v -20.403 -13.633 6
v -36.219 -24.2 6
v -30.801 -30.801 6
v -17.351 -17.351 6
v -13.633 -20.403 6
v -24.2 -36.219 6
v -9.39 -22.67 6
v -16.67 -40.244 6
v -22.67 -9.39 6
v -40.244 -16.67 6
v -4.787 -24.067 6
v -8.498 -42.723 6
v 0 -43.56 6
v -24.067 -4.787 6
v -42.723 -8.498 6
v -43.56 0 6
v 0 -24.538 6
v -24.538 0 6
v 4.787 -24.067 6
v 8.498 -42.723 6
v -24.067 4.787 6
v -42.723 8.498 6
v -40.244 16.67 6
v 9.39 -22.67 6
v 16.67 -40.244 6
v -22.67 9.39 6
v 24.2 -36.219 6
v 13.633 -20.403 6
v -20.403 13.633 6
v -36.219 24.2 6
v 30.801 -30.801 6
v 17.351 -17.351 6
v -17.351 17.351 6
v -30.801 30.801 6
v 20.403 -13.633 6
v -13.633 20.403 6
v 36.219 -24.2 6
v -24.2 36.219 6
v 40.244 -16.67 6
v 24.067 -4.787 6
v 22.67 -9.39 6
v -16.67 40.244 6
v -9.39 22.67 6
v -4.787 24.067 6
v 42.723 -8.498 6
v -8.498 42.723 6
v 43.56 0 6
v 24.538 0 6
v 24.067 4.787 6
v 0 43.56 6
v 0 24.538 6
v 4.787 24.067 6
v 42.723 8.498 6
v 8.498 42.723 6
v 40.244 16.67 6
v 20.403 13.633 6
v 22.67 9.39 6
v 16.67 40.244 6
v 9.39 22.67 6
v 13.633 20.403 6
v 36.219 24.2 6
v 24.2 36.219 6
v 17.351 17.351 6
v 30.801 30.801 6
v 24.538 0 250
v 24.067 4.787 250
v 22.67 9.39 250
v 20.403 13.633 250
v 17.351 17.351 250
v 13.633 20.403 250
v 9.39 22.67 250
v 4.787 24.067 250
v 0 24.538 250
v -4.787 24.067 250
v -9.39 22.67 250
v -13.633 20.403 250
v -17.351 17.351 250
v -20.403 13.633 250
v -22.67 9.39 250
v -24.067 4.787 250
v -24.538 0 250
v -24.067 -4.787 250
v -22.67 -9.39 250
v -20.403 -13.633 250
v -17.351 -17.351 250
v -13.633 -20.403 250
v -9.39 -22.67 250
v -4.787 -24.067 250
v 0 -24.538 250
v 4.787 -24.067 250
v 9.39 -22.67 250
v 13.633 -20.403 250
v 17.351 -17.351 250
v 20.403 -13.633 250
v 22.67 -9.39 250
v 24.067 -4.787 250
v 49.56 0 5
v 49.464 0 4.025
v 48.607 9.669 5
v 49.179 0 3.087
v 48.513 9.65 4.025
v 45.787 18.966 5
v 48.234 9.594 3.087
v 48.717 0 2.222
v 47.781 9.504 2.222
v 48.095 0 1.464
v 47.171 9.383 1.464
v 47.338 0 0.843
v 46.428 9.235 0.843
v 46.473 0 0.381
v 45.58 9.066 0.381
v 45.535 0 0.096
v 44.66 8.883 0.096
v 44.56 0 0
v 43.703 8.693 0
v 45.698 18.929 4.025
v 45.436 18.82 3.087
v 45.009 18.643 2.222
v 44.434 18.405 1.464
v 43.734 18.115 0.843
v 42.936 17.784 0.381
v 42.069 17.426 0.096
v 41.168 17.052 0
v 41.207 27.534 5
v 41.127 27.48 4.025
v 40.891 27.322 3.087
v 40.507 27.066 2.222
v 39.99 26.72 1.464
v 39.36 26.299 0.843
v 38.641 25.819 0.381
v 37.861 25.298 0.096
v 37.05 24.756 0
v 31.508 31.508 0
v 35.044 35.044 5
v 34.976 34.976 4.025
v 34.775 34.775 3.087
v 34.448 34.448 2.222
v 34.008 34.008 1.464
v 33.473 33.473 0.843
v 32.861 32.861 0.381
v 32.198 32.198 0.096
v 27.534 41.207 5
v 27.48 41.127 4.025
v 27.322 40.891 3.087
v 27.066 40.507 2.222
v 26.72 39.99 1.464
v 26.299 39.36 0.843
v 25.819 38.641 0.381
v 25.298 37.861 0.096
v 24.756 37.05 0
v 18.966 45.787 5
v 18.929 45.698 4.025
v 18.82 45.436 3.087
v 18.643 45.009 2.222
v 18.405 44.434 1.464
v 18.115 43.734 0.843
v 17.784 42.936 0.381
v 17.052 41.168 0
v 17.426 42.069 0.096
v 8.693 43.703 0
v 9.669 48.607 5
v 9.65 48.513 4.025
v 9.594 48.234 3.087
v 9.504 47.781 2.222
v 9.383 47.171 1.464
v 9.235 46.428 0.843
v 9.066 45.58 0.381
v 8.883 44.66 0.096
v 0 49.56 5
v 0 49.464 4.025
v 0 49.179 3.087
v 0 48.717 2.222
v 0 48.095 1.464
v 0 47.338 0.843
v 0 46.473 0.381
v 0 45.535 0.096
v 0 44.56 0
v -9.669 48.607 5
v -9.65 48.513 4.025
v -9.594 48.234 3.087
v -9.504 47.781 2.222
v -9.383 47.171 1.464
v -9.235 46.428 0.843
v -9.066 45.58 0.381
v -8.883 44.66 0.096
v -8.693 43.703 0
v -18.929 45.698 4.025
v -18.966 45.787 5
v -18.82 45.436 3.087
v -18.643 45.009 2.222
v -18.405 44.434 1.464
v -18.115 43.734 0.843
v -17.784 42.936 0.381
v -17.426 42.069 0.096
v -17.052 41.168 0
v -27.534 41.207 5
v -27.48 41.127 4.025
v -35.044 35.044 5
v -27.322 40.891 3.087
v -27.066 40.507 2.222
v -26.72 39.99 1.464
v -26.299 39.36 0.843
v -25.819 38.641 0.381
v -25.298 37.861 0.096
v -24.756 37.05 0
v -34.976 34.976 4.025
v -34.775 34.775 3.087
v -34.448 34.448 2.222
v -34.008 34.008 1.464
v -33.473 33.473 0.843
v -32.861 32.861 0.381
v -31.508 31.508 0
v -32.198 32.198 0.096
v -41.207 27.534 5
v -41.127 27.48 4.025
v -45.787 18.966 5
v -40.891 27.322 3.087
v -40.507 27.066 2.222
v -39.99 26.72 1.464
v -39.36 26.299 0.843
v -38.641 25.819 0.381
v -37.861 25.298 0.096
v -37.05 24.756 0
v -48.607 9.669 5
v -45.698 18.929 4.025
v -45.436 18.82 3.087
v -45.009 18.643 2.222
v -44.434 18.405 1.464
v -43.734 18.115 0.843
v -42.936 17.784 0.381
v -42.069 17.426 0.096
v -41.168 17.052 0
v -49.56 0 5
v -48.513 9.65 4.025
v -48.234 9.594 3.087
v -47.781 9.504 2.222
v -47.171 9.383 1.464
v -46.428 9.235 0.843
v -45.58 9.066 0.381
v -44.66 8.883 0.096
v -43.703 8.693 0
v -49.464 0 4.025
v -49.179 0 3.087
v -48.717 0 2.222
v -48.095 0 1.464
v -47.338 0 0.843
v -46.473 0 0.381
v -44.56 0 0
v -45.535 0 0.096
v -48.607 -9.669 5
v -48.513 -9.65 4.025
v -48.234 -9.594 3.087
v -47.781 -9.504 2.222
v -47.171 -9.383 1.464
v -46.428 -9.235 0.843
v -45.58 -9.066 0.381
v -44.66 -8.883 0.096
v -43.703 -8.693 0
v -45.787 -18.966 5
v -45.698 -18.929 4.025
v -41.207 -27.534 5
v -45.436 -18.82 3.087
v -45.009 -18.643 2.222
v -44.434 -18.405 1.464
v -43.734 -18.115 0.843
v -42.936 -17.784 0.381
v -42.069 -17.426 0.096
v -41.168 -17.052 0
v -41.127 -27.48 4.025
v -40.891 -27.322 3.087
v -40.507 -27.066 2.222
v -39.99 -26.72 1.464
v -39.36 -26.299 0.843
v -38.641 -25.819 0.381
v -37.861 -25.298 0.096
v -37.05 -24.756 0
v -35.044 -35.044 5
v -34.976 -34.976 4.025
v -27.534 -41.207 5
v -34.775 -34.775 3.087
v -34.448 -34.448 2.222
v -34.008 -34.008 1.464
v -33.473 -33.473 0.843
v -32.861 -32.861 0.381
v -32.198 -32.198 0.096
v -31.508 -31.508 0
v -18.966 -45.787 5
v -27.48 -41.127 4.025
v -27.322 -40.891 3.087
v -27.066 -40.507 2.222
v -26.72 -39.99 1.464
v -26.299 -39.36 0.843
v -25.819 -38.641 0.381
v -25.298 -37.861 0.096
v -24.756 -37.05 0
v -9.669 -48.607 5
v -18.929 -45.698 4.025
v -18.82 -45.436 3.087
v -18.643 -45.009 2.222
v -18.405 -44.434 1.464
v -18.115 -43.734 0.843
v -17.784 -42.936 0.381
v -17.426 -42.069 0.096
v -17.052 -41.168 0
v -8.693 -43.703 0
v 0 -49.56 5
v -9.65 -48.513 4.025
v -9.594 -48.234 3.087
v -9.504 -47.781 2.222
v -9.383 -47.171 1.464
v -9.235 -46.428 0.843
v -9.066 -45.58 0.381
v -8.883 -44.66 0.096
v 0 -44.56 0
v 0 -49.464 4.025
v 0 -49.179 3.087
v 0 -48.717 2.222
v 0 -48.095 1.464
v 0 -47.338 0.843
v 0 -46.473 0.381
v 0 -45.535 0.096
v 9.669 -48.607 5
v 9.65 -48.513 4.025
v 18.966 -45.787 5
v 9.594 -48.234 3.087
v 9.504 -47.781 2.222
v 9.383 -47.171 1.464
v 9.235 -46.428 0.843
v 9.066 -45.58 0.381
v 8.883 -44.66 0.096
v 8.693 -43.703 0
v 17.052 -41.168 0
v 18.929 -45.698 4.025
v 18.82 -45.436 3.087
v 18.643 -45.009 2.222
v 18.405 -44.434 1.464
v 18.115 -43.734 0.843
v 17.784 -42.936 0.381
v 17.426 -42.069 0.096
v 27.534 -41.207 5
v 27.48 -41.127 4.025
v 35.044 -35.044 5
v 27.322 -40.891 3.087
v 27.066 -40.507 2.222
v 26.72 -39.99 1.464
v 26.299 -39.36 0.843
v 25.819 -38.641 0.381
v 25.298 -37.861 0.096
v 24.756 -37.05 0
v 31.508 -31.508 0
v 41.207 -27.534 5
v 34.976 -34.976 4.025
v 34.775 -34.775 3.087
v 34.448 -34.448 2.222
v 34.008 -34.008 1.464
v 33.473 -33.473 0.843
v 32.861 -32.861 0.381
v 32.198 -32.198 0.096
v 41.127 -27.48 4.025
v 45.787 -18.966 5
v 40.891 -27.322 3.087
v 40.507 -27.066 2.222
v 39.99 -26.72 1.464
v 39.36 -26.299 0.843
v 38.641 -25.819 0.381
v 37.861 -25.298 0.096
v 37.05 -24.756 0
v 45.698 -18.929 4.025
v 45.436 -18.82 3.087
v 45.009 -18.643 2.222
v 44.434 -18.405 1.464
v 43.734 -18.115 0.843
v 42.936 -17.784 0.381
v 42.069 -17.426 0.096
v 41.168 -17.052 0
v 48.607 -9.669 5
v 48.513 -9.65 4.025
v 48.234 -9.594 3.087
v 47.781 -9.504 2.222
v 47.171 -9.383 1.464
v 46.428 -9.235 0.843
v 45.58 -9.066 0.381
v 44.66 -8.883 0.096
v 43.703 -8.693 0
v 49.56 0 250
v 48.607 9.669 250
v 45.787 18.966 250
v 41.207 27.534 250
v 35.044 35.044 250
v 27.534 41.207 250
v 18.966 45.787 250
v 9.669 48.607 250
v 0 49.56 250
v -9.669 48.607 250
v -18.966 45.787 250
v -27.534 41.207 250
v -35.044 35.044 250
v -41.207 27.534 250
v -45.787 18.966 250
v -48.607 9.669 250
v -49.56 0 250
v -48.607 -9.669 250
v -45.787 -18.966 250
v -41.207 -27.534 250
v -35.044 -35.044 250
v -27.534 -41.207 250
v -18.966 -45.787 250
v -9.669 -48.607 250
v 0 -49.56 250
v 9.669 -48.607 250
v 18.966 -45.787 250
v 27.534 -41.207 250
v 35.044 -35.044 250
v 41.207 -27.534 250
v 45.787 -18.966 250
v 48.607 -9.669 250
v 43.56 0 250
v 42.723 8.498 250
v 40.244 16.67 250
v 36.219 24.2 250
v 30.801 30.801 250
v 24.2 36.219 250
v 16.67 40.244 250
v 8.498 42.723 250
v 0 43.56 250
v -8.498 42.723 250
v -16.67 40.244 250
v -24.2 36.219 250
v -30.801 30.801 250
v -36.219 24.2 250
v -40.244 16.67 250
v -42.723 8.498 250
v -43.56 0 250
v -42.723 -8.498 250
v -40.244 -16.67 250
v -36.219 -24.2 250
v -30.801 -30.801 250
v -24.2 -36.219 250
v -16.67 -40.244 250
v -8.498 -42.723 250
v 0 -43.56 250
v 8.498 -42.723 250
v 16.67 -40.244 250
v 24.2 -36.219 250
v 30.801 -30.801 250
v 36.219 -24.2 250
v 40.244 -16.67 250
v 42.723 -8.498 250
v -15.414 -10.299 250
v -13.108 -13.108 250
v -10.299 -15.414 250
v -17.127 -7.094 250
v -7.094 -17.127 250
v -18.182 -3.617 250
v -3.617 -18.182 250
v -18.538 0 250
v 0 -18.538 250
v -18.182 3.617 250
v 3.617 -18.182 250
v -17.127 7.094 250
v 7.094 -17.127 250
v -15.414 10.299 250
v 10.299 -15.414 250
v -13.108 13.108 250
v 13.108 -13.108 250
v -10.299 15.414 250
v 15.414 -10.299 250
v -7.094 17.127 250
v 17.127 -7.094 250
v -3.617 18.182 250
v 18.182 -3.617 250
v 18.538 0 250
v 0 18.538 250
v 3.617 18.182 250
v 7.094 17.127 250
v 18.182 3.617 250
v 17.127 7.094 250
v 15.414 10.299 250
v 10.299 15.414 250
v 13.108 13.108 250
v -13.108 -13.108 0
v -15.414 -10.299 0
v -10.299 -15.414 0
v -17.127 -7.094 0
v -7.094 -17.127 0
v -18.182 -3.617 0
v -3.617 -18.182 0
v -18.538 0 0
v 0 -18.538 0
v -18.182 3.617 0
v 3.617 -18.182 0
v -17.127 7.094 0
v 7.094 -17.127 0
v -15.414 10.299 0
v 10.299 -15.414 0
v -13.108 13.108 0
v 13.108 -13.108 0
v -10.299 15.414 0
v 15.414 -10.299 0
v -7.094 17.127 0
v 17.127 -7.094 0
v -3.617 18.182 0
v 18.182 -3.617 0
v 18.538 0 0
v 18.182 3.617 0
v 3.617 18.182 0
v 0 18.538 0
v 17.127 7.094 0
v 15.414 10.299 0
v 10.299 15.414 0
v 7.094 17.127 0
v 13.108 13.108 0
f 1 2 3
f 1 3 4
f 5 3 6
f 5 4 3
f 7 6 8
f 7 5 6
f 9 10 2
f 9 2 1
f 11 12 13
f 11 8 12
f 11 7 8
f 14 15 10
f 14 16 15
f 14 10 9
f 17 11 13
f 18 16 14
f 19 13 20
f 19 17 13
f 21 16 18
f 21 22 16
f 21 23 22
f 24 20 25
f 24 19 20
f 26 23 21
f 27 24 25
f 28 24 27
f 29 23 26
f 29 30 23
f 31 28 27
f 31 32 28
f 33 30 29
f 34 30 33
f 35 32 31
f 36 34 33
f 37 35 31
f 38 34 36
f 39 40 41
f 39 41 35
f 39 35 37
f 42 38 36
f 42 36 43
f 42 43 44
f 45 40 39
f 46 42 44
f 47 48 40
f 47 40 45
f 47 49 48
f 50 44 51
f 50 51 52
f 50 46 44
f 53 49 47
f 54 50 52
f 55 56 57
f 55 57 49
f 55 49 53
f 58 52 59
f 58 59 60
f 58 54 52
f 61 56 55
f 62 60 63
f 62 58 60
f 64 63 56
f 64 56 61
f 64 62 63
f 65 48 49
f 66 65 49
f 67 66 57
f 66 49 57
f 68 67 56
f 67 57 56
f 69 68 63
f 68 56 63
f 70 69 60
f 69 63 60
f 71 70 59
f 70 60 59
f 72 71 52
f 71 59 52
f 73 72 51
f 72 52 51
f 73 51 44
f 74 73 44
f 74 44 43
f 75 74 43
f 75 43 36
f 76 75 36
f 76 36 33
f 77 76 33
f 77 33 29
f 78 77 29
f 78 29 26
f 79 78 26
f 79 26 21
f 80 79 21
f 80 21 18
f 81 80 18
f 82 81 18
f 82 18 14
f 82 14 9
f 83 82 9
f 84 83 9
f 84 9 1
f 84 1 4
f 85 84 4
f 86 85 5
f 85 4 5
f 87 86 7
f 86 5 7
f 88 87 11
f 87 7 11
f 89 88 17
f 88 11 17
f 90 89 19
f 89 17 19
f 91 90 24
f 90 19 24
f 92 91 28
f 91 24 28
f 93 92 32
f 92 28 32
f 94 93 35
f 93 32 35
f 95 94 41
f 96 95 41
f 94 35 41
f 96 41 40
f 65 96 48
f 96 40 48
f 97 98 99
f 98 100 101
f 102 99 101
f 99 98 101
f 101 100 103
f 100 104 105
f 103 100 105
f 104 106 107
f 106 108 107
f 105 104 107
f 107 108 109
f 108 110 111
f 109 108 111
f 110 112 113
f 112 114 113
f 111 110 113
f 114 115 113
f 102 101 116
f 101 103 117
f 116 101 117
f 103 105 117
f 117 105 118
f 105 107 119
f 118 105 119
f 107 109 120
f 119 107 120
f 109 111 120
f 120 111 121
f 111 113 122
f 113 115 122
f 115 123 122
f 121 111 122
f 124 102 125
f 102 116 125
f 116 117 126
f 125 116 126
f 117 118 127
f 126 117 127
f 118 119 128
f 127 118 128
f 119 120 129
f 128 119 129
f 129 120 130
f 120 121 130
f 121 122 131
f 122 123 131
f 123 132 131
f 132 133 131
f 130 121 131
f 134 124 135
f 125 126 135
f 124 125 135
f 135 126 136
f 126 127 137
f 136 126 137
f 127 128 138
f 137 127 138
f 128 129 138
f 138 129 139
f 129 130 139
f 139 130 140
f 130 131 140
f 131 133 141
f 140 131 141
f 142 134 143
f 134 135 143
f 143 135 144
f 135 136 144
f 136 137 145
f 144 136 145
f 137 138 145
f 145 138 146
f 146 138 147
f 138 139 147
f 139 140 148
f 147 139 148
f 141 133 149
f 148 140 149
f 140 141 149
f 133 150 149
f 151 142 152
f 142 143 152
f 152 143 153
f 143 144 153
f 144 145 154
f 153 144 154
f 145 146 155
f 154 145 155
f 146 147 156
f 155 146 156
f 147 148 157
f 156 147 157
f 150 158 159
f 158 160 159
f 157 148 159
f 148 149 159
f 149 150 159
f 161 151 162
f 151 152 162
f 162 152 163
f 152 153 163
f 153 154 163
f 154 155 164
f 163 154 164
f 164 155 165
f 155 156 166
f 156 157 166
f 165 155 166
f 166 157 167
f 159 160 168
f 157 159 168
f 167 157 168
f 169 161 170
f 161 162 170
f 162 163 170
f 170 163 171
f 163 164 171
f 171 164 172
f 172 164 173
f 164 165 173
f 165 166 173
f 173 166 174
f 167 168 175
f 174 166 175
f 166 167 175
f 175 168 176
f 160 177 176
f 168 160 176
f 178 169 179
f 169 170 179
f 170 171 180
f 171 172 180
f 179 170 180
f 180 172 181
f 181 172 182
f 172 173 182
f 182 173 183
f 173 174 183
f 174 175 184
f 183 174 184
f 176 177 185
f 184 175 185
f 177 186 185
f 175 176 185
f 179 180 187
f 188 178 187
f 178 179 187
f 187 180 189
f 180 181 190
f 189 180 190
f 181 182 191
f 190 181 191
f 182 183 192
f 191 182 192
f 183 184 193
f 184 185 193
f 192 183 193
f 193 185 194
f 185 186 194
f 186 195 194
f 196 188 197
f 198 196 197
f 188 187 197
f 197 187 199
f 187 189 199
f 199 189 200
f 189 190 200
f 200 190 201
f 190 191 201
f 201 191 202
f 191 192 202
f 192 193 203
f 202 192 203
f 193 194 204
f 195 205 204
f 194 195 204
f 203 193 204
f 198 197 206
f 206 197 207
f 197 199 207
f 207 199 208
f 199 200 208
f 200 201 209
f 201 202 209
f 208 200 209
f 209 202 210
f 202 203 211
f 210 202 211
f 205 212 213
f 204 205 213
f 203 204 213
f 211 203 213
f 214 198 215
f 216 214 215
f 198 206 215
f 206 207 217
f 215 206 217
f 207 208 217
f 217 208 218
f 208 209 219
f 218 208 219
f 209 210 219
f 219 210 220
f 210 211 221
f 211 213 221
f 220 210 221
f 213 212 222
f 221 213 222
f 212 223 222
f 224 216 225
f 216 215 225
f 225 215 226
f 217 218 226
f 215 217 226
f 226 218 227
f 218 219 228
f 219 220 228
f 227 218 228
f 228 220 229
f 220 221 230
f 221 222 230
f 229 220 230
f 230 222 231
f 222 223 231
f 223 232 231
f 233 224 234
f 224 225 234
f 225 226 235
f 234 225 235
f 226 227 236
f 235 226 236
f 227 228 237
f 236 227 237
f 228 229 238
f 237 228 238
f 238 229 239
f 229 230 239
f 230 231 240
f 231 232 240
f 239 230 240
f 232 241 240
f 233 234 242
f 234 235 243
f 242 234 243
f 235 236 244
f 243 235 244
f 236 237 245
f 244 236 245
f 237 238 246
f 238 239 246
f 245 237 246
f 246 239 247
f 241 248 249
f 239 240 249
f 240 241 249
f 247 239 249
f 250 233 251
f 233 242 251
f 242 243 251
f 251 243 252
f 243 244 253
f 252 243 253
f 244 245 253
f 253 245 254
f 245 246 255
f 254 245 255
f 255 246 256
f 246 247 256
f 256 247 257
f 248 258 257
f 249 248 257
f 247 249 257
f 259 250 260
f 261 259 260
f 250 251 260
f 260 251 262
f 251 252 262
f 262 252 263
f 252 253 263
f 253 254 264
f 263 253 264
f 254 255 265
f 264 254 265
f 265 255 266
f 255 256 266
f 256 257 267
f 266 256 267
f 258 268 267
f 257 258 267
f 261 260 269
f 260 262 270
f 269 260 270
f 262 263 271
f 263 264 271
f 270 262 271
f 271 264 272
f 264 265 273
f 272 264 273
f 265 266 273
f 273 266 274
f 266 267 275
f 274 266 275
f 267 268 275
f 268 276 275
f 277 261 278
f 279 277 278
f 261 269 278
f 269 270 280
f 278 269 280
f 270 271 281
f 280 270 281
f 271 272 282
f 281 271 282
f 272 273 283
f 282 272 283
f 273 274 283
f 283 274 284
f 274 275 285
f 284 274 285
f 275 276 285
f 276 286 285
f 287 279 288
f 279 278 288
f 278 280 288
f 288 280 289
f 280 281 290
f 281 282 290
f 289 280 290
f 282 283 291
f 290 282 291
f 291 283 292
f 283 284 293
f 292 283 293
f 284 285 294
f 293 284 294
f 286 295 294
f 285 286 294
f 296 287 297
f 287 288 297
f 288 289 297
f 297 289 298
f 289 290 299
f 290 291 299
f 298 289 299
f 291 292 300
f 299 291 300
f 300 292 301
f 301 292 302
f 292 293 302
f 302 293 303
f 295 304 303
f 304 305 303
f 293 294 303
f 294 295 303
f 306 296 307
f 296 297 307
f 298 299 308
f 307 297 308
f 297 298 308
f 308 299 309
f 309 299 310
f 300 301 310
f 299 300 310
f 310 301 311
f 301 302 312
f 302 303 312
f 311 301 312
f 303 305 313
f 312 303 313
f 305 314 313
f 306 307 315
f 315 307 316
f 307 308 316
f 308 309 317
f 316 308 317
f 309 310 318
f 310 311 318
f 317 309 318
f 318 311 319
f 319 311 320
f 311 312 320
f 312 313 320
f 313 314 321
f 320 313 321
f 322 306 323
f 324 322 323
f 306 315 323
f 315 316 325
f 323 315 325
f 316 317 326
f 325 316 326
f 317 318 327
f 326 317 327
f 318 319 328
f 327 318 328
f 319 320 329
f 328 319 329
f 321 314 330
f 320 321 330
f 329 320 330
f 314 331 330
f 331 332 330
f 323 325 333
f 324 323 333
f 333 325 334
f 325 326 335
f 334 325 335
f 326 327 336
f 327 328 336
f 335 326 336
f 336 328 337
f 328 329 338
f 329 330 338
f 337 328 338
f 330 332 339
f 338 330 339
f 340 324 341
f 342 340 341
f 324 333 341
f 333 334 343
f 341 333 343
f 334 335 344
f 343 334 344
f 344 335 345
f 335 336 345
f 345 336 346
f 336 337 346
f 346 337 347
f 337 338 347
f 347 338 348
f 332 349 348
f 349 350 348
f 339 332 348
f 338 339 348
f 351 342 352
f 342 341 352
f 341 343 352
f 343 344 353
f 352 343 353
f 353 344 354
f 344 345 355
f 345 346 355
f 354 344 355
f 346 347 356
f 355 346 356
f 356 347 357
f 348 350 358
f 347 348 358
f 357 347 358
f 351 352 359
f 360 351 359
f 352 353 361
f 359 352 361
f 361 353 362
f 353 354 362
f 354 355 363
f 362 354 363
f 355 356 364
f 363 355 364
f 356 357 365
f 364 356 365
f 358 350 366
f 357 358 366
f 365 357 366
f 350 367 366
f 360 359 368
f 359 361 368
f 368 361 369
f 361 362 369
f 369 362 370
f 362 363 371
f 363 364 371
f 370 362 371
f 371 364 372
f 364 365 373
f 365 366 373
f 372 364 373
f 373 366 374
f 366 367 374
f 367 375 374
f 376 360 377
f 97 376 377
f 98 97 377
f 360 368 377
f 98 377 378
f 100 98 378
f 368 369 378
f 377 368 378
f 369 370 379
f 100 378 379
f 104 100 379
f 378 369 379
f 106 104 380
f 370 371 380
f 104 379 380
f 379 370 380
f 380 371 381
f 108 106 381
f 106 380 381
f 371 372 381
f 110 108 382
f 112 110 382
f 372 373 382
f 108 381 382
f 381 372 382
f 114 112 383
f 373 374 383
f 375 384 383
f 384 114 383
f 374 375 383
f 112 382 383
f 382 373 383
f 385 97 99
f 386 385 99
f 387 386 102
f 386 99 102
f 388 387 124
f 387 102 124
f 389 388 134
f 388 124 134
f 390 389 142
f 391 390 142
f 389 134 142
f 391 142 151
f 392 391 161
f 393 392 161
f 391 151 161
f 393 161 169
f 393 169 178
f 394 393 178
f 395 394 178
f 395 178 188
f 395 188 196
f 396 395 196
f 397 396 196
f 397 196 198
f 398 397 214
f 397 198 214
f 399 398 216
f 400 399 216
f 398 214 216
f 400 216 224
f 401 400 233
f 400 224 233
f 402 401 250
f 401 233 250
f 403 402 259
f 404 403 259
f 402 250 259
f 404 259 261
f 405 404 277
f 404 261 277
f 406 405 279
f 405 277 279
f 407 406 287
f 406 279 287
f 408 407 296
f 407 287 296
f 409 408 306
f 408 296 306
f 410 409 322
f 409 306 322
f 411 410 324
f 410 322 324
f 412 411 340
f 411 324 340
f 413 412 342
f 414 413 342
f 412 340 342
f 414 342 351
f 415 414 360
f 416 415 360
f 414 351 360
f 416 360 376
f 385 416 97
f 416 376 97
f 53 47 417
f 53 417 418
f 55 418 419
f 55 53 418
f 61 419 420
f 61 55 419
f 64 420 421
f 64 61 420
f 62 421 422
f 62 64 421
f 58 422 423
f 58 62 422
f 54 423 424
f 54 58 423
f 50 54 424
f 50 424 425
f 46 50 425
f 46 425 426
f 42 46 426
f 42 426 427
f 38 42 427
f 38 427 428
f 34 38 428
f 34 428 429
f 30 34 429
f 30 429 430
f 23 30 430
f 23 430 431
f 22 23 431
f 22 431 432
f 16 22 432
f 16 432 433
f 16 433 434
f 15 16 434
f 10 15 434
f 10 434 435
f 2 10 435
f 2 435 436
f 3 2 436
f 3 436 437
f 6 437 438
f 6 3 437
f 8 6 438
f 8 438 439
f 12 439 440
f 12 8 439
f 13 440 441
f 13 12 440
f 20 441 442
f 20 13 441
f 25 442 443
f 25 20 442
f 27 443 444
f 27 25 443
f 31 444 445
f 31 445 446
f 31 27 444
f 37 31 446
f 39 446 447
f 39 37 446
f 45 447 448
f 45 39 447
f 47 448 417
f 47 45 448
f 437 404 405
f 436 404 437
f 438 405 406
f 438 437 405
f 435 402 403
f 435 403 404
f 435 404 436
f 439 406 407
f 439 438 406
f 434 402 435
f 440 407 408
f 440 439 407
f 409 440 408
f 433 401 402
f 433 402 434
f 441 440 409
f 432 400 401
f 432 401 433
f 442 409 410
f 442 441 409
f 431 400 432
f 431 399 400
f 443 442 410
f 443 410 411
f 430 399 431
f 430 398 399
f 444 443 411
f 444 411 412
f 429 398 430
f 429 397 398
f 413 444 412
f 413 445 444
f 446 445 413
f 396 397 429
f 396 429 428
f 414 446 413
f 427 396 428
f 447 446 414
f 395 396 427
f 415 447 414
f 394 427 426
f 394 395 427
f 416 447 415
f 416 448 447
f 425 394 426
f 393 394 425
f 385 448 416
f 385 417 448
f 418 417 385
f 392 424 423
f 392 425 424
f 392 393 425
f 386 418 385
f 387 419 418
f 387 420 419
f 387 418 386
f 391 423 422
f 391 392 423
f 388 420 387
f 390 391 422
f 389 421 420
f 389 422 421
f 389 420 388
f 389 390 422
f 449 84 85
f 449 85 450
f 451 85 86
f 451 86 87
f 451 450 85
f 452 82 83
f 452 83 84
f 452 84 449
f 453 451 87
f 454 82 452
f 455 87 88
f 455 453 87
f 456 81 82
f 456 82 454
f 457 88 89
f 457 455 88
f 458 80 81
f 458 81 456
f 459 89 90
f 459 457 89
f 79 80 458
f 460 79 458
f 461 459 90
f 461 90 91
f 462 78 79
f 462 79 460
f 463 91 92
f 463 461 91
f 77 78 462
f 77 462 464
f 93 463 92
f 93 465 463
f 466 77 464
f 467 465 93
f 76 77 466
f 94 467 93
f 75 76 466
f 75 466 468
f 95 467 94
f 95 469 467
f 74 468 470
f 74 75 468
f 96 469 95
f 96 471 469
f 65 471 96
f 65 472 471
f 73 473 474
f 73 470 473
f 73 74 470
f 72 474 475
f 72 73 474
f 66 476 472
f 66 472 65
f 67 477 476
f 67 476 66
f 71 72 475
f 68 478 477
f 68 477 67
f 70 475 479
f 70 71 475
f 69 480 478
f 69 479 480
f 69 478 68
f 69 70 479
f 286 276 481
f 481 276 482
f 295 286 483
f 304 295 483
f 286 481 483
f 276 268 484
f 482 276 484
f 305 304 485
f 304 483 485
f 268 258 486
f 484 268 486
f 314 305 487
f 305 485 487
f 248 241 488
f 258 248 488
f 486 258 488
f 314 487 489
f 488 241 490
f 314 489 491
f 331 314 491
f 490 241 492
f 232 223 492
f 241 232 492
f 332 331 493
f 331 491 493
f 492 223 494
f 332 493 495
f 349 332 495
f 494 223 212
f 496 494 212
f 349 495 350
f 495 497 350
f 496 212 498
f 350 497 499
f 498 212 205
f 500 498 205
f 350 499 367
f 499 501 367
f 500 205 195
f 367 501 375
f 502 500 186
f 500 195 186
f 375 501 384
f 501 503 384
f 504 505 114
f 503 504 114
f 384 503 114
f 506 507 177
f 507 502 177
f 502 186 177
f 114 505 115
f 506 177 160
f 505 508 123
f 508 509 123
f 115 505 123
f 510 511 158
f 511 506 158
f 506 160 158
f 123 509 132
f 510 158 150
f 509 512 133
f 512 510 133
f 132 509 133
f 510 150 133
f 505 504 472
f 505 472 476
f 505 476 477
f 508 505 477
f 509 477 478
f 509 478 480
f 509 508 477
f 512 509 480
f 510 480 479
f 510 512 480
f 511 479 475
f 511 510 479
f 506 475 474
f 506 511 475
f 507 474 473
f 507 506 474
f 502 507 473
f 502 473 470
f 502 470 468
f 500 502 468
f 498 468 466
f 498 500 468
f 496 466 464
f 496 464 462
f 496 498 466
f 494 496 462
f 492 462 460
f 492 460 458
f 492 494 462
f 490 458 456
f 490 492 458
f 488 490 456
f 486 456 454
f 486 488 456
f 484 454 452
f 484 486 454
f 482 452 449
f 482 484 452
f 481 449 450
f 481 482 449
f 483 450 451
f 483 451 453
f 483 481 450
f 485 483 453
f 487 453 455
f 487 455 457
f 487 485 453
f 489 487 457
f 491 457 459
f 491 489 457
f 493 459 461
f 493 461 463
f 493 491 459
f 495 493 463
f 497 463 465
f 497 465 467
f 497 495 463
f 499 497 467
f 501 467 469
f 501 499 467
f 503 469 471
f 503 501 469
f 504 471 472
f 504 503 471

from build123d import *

# Parameters (mm, degrees)
F0_R     = 49.559661
F0_R_2   = 18.538097
F1_DEPTH = 250
F2_R     = 5
F3_T     = -6


with BuildPart() as f1:
    # F0 (on Top) → F1 (new body)
    with BuildSketch(Plane.XY):
        Circle(F0_R)
        Circle(F0_R_2, mode=Mode.SUBTRACT)
    extrude(amount=F1_DEPTH)

    # F2
    f2_edges = [f1.edges().sort_by_distance(p)[0] for p in [
        (-49.559661, 0, 0),
    ]]
    fillet(f2_edges, radius=F2_R)

    # F3
    f3_openings = [f1.faces().sort_by_distance(p)[0] for p in [
        (-48.157902, 0, 250),
    ]]
    offset(amount=F3_T, openings=f3_openings)


solid = f1.part
